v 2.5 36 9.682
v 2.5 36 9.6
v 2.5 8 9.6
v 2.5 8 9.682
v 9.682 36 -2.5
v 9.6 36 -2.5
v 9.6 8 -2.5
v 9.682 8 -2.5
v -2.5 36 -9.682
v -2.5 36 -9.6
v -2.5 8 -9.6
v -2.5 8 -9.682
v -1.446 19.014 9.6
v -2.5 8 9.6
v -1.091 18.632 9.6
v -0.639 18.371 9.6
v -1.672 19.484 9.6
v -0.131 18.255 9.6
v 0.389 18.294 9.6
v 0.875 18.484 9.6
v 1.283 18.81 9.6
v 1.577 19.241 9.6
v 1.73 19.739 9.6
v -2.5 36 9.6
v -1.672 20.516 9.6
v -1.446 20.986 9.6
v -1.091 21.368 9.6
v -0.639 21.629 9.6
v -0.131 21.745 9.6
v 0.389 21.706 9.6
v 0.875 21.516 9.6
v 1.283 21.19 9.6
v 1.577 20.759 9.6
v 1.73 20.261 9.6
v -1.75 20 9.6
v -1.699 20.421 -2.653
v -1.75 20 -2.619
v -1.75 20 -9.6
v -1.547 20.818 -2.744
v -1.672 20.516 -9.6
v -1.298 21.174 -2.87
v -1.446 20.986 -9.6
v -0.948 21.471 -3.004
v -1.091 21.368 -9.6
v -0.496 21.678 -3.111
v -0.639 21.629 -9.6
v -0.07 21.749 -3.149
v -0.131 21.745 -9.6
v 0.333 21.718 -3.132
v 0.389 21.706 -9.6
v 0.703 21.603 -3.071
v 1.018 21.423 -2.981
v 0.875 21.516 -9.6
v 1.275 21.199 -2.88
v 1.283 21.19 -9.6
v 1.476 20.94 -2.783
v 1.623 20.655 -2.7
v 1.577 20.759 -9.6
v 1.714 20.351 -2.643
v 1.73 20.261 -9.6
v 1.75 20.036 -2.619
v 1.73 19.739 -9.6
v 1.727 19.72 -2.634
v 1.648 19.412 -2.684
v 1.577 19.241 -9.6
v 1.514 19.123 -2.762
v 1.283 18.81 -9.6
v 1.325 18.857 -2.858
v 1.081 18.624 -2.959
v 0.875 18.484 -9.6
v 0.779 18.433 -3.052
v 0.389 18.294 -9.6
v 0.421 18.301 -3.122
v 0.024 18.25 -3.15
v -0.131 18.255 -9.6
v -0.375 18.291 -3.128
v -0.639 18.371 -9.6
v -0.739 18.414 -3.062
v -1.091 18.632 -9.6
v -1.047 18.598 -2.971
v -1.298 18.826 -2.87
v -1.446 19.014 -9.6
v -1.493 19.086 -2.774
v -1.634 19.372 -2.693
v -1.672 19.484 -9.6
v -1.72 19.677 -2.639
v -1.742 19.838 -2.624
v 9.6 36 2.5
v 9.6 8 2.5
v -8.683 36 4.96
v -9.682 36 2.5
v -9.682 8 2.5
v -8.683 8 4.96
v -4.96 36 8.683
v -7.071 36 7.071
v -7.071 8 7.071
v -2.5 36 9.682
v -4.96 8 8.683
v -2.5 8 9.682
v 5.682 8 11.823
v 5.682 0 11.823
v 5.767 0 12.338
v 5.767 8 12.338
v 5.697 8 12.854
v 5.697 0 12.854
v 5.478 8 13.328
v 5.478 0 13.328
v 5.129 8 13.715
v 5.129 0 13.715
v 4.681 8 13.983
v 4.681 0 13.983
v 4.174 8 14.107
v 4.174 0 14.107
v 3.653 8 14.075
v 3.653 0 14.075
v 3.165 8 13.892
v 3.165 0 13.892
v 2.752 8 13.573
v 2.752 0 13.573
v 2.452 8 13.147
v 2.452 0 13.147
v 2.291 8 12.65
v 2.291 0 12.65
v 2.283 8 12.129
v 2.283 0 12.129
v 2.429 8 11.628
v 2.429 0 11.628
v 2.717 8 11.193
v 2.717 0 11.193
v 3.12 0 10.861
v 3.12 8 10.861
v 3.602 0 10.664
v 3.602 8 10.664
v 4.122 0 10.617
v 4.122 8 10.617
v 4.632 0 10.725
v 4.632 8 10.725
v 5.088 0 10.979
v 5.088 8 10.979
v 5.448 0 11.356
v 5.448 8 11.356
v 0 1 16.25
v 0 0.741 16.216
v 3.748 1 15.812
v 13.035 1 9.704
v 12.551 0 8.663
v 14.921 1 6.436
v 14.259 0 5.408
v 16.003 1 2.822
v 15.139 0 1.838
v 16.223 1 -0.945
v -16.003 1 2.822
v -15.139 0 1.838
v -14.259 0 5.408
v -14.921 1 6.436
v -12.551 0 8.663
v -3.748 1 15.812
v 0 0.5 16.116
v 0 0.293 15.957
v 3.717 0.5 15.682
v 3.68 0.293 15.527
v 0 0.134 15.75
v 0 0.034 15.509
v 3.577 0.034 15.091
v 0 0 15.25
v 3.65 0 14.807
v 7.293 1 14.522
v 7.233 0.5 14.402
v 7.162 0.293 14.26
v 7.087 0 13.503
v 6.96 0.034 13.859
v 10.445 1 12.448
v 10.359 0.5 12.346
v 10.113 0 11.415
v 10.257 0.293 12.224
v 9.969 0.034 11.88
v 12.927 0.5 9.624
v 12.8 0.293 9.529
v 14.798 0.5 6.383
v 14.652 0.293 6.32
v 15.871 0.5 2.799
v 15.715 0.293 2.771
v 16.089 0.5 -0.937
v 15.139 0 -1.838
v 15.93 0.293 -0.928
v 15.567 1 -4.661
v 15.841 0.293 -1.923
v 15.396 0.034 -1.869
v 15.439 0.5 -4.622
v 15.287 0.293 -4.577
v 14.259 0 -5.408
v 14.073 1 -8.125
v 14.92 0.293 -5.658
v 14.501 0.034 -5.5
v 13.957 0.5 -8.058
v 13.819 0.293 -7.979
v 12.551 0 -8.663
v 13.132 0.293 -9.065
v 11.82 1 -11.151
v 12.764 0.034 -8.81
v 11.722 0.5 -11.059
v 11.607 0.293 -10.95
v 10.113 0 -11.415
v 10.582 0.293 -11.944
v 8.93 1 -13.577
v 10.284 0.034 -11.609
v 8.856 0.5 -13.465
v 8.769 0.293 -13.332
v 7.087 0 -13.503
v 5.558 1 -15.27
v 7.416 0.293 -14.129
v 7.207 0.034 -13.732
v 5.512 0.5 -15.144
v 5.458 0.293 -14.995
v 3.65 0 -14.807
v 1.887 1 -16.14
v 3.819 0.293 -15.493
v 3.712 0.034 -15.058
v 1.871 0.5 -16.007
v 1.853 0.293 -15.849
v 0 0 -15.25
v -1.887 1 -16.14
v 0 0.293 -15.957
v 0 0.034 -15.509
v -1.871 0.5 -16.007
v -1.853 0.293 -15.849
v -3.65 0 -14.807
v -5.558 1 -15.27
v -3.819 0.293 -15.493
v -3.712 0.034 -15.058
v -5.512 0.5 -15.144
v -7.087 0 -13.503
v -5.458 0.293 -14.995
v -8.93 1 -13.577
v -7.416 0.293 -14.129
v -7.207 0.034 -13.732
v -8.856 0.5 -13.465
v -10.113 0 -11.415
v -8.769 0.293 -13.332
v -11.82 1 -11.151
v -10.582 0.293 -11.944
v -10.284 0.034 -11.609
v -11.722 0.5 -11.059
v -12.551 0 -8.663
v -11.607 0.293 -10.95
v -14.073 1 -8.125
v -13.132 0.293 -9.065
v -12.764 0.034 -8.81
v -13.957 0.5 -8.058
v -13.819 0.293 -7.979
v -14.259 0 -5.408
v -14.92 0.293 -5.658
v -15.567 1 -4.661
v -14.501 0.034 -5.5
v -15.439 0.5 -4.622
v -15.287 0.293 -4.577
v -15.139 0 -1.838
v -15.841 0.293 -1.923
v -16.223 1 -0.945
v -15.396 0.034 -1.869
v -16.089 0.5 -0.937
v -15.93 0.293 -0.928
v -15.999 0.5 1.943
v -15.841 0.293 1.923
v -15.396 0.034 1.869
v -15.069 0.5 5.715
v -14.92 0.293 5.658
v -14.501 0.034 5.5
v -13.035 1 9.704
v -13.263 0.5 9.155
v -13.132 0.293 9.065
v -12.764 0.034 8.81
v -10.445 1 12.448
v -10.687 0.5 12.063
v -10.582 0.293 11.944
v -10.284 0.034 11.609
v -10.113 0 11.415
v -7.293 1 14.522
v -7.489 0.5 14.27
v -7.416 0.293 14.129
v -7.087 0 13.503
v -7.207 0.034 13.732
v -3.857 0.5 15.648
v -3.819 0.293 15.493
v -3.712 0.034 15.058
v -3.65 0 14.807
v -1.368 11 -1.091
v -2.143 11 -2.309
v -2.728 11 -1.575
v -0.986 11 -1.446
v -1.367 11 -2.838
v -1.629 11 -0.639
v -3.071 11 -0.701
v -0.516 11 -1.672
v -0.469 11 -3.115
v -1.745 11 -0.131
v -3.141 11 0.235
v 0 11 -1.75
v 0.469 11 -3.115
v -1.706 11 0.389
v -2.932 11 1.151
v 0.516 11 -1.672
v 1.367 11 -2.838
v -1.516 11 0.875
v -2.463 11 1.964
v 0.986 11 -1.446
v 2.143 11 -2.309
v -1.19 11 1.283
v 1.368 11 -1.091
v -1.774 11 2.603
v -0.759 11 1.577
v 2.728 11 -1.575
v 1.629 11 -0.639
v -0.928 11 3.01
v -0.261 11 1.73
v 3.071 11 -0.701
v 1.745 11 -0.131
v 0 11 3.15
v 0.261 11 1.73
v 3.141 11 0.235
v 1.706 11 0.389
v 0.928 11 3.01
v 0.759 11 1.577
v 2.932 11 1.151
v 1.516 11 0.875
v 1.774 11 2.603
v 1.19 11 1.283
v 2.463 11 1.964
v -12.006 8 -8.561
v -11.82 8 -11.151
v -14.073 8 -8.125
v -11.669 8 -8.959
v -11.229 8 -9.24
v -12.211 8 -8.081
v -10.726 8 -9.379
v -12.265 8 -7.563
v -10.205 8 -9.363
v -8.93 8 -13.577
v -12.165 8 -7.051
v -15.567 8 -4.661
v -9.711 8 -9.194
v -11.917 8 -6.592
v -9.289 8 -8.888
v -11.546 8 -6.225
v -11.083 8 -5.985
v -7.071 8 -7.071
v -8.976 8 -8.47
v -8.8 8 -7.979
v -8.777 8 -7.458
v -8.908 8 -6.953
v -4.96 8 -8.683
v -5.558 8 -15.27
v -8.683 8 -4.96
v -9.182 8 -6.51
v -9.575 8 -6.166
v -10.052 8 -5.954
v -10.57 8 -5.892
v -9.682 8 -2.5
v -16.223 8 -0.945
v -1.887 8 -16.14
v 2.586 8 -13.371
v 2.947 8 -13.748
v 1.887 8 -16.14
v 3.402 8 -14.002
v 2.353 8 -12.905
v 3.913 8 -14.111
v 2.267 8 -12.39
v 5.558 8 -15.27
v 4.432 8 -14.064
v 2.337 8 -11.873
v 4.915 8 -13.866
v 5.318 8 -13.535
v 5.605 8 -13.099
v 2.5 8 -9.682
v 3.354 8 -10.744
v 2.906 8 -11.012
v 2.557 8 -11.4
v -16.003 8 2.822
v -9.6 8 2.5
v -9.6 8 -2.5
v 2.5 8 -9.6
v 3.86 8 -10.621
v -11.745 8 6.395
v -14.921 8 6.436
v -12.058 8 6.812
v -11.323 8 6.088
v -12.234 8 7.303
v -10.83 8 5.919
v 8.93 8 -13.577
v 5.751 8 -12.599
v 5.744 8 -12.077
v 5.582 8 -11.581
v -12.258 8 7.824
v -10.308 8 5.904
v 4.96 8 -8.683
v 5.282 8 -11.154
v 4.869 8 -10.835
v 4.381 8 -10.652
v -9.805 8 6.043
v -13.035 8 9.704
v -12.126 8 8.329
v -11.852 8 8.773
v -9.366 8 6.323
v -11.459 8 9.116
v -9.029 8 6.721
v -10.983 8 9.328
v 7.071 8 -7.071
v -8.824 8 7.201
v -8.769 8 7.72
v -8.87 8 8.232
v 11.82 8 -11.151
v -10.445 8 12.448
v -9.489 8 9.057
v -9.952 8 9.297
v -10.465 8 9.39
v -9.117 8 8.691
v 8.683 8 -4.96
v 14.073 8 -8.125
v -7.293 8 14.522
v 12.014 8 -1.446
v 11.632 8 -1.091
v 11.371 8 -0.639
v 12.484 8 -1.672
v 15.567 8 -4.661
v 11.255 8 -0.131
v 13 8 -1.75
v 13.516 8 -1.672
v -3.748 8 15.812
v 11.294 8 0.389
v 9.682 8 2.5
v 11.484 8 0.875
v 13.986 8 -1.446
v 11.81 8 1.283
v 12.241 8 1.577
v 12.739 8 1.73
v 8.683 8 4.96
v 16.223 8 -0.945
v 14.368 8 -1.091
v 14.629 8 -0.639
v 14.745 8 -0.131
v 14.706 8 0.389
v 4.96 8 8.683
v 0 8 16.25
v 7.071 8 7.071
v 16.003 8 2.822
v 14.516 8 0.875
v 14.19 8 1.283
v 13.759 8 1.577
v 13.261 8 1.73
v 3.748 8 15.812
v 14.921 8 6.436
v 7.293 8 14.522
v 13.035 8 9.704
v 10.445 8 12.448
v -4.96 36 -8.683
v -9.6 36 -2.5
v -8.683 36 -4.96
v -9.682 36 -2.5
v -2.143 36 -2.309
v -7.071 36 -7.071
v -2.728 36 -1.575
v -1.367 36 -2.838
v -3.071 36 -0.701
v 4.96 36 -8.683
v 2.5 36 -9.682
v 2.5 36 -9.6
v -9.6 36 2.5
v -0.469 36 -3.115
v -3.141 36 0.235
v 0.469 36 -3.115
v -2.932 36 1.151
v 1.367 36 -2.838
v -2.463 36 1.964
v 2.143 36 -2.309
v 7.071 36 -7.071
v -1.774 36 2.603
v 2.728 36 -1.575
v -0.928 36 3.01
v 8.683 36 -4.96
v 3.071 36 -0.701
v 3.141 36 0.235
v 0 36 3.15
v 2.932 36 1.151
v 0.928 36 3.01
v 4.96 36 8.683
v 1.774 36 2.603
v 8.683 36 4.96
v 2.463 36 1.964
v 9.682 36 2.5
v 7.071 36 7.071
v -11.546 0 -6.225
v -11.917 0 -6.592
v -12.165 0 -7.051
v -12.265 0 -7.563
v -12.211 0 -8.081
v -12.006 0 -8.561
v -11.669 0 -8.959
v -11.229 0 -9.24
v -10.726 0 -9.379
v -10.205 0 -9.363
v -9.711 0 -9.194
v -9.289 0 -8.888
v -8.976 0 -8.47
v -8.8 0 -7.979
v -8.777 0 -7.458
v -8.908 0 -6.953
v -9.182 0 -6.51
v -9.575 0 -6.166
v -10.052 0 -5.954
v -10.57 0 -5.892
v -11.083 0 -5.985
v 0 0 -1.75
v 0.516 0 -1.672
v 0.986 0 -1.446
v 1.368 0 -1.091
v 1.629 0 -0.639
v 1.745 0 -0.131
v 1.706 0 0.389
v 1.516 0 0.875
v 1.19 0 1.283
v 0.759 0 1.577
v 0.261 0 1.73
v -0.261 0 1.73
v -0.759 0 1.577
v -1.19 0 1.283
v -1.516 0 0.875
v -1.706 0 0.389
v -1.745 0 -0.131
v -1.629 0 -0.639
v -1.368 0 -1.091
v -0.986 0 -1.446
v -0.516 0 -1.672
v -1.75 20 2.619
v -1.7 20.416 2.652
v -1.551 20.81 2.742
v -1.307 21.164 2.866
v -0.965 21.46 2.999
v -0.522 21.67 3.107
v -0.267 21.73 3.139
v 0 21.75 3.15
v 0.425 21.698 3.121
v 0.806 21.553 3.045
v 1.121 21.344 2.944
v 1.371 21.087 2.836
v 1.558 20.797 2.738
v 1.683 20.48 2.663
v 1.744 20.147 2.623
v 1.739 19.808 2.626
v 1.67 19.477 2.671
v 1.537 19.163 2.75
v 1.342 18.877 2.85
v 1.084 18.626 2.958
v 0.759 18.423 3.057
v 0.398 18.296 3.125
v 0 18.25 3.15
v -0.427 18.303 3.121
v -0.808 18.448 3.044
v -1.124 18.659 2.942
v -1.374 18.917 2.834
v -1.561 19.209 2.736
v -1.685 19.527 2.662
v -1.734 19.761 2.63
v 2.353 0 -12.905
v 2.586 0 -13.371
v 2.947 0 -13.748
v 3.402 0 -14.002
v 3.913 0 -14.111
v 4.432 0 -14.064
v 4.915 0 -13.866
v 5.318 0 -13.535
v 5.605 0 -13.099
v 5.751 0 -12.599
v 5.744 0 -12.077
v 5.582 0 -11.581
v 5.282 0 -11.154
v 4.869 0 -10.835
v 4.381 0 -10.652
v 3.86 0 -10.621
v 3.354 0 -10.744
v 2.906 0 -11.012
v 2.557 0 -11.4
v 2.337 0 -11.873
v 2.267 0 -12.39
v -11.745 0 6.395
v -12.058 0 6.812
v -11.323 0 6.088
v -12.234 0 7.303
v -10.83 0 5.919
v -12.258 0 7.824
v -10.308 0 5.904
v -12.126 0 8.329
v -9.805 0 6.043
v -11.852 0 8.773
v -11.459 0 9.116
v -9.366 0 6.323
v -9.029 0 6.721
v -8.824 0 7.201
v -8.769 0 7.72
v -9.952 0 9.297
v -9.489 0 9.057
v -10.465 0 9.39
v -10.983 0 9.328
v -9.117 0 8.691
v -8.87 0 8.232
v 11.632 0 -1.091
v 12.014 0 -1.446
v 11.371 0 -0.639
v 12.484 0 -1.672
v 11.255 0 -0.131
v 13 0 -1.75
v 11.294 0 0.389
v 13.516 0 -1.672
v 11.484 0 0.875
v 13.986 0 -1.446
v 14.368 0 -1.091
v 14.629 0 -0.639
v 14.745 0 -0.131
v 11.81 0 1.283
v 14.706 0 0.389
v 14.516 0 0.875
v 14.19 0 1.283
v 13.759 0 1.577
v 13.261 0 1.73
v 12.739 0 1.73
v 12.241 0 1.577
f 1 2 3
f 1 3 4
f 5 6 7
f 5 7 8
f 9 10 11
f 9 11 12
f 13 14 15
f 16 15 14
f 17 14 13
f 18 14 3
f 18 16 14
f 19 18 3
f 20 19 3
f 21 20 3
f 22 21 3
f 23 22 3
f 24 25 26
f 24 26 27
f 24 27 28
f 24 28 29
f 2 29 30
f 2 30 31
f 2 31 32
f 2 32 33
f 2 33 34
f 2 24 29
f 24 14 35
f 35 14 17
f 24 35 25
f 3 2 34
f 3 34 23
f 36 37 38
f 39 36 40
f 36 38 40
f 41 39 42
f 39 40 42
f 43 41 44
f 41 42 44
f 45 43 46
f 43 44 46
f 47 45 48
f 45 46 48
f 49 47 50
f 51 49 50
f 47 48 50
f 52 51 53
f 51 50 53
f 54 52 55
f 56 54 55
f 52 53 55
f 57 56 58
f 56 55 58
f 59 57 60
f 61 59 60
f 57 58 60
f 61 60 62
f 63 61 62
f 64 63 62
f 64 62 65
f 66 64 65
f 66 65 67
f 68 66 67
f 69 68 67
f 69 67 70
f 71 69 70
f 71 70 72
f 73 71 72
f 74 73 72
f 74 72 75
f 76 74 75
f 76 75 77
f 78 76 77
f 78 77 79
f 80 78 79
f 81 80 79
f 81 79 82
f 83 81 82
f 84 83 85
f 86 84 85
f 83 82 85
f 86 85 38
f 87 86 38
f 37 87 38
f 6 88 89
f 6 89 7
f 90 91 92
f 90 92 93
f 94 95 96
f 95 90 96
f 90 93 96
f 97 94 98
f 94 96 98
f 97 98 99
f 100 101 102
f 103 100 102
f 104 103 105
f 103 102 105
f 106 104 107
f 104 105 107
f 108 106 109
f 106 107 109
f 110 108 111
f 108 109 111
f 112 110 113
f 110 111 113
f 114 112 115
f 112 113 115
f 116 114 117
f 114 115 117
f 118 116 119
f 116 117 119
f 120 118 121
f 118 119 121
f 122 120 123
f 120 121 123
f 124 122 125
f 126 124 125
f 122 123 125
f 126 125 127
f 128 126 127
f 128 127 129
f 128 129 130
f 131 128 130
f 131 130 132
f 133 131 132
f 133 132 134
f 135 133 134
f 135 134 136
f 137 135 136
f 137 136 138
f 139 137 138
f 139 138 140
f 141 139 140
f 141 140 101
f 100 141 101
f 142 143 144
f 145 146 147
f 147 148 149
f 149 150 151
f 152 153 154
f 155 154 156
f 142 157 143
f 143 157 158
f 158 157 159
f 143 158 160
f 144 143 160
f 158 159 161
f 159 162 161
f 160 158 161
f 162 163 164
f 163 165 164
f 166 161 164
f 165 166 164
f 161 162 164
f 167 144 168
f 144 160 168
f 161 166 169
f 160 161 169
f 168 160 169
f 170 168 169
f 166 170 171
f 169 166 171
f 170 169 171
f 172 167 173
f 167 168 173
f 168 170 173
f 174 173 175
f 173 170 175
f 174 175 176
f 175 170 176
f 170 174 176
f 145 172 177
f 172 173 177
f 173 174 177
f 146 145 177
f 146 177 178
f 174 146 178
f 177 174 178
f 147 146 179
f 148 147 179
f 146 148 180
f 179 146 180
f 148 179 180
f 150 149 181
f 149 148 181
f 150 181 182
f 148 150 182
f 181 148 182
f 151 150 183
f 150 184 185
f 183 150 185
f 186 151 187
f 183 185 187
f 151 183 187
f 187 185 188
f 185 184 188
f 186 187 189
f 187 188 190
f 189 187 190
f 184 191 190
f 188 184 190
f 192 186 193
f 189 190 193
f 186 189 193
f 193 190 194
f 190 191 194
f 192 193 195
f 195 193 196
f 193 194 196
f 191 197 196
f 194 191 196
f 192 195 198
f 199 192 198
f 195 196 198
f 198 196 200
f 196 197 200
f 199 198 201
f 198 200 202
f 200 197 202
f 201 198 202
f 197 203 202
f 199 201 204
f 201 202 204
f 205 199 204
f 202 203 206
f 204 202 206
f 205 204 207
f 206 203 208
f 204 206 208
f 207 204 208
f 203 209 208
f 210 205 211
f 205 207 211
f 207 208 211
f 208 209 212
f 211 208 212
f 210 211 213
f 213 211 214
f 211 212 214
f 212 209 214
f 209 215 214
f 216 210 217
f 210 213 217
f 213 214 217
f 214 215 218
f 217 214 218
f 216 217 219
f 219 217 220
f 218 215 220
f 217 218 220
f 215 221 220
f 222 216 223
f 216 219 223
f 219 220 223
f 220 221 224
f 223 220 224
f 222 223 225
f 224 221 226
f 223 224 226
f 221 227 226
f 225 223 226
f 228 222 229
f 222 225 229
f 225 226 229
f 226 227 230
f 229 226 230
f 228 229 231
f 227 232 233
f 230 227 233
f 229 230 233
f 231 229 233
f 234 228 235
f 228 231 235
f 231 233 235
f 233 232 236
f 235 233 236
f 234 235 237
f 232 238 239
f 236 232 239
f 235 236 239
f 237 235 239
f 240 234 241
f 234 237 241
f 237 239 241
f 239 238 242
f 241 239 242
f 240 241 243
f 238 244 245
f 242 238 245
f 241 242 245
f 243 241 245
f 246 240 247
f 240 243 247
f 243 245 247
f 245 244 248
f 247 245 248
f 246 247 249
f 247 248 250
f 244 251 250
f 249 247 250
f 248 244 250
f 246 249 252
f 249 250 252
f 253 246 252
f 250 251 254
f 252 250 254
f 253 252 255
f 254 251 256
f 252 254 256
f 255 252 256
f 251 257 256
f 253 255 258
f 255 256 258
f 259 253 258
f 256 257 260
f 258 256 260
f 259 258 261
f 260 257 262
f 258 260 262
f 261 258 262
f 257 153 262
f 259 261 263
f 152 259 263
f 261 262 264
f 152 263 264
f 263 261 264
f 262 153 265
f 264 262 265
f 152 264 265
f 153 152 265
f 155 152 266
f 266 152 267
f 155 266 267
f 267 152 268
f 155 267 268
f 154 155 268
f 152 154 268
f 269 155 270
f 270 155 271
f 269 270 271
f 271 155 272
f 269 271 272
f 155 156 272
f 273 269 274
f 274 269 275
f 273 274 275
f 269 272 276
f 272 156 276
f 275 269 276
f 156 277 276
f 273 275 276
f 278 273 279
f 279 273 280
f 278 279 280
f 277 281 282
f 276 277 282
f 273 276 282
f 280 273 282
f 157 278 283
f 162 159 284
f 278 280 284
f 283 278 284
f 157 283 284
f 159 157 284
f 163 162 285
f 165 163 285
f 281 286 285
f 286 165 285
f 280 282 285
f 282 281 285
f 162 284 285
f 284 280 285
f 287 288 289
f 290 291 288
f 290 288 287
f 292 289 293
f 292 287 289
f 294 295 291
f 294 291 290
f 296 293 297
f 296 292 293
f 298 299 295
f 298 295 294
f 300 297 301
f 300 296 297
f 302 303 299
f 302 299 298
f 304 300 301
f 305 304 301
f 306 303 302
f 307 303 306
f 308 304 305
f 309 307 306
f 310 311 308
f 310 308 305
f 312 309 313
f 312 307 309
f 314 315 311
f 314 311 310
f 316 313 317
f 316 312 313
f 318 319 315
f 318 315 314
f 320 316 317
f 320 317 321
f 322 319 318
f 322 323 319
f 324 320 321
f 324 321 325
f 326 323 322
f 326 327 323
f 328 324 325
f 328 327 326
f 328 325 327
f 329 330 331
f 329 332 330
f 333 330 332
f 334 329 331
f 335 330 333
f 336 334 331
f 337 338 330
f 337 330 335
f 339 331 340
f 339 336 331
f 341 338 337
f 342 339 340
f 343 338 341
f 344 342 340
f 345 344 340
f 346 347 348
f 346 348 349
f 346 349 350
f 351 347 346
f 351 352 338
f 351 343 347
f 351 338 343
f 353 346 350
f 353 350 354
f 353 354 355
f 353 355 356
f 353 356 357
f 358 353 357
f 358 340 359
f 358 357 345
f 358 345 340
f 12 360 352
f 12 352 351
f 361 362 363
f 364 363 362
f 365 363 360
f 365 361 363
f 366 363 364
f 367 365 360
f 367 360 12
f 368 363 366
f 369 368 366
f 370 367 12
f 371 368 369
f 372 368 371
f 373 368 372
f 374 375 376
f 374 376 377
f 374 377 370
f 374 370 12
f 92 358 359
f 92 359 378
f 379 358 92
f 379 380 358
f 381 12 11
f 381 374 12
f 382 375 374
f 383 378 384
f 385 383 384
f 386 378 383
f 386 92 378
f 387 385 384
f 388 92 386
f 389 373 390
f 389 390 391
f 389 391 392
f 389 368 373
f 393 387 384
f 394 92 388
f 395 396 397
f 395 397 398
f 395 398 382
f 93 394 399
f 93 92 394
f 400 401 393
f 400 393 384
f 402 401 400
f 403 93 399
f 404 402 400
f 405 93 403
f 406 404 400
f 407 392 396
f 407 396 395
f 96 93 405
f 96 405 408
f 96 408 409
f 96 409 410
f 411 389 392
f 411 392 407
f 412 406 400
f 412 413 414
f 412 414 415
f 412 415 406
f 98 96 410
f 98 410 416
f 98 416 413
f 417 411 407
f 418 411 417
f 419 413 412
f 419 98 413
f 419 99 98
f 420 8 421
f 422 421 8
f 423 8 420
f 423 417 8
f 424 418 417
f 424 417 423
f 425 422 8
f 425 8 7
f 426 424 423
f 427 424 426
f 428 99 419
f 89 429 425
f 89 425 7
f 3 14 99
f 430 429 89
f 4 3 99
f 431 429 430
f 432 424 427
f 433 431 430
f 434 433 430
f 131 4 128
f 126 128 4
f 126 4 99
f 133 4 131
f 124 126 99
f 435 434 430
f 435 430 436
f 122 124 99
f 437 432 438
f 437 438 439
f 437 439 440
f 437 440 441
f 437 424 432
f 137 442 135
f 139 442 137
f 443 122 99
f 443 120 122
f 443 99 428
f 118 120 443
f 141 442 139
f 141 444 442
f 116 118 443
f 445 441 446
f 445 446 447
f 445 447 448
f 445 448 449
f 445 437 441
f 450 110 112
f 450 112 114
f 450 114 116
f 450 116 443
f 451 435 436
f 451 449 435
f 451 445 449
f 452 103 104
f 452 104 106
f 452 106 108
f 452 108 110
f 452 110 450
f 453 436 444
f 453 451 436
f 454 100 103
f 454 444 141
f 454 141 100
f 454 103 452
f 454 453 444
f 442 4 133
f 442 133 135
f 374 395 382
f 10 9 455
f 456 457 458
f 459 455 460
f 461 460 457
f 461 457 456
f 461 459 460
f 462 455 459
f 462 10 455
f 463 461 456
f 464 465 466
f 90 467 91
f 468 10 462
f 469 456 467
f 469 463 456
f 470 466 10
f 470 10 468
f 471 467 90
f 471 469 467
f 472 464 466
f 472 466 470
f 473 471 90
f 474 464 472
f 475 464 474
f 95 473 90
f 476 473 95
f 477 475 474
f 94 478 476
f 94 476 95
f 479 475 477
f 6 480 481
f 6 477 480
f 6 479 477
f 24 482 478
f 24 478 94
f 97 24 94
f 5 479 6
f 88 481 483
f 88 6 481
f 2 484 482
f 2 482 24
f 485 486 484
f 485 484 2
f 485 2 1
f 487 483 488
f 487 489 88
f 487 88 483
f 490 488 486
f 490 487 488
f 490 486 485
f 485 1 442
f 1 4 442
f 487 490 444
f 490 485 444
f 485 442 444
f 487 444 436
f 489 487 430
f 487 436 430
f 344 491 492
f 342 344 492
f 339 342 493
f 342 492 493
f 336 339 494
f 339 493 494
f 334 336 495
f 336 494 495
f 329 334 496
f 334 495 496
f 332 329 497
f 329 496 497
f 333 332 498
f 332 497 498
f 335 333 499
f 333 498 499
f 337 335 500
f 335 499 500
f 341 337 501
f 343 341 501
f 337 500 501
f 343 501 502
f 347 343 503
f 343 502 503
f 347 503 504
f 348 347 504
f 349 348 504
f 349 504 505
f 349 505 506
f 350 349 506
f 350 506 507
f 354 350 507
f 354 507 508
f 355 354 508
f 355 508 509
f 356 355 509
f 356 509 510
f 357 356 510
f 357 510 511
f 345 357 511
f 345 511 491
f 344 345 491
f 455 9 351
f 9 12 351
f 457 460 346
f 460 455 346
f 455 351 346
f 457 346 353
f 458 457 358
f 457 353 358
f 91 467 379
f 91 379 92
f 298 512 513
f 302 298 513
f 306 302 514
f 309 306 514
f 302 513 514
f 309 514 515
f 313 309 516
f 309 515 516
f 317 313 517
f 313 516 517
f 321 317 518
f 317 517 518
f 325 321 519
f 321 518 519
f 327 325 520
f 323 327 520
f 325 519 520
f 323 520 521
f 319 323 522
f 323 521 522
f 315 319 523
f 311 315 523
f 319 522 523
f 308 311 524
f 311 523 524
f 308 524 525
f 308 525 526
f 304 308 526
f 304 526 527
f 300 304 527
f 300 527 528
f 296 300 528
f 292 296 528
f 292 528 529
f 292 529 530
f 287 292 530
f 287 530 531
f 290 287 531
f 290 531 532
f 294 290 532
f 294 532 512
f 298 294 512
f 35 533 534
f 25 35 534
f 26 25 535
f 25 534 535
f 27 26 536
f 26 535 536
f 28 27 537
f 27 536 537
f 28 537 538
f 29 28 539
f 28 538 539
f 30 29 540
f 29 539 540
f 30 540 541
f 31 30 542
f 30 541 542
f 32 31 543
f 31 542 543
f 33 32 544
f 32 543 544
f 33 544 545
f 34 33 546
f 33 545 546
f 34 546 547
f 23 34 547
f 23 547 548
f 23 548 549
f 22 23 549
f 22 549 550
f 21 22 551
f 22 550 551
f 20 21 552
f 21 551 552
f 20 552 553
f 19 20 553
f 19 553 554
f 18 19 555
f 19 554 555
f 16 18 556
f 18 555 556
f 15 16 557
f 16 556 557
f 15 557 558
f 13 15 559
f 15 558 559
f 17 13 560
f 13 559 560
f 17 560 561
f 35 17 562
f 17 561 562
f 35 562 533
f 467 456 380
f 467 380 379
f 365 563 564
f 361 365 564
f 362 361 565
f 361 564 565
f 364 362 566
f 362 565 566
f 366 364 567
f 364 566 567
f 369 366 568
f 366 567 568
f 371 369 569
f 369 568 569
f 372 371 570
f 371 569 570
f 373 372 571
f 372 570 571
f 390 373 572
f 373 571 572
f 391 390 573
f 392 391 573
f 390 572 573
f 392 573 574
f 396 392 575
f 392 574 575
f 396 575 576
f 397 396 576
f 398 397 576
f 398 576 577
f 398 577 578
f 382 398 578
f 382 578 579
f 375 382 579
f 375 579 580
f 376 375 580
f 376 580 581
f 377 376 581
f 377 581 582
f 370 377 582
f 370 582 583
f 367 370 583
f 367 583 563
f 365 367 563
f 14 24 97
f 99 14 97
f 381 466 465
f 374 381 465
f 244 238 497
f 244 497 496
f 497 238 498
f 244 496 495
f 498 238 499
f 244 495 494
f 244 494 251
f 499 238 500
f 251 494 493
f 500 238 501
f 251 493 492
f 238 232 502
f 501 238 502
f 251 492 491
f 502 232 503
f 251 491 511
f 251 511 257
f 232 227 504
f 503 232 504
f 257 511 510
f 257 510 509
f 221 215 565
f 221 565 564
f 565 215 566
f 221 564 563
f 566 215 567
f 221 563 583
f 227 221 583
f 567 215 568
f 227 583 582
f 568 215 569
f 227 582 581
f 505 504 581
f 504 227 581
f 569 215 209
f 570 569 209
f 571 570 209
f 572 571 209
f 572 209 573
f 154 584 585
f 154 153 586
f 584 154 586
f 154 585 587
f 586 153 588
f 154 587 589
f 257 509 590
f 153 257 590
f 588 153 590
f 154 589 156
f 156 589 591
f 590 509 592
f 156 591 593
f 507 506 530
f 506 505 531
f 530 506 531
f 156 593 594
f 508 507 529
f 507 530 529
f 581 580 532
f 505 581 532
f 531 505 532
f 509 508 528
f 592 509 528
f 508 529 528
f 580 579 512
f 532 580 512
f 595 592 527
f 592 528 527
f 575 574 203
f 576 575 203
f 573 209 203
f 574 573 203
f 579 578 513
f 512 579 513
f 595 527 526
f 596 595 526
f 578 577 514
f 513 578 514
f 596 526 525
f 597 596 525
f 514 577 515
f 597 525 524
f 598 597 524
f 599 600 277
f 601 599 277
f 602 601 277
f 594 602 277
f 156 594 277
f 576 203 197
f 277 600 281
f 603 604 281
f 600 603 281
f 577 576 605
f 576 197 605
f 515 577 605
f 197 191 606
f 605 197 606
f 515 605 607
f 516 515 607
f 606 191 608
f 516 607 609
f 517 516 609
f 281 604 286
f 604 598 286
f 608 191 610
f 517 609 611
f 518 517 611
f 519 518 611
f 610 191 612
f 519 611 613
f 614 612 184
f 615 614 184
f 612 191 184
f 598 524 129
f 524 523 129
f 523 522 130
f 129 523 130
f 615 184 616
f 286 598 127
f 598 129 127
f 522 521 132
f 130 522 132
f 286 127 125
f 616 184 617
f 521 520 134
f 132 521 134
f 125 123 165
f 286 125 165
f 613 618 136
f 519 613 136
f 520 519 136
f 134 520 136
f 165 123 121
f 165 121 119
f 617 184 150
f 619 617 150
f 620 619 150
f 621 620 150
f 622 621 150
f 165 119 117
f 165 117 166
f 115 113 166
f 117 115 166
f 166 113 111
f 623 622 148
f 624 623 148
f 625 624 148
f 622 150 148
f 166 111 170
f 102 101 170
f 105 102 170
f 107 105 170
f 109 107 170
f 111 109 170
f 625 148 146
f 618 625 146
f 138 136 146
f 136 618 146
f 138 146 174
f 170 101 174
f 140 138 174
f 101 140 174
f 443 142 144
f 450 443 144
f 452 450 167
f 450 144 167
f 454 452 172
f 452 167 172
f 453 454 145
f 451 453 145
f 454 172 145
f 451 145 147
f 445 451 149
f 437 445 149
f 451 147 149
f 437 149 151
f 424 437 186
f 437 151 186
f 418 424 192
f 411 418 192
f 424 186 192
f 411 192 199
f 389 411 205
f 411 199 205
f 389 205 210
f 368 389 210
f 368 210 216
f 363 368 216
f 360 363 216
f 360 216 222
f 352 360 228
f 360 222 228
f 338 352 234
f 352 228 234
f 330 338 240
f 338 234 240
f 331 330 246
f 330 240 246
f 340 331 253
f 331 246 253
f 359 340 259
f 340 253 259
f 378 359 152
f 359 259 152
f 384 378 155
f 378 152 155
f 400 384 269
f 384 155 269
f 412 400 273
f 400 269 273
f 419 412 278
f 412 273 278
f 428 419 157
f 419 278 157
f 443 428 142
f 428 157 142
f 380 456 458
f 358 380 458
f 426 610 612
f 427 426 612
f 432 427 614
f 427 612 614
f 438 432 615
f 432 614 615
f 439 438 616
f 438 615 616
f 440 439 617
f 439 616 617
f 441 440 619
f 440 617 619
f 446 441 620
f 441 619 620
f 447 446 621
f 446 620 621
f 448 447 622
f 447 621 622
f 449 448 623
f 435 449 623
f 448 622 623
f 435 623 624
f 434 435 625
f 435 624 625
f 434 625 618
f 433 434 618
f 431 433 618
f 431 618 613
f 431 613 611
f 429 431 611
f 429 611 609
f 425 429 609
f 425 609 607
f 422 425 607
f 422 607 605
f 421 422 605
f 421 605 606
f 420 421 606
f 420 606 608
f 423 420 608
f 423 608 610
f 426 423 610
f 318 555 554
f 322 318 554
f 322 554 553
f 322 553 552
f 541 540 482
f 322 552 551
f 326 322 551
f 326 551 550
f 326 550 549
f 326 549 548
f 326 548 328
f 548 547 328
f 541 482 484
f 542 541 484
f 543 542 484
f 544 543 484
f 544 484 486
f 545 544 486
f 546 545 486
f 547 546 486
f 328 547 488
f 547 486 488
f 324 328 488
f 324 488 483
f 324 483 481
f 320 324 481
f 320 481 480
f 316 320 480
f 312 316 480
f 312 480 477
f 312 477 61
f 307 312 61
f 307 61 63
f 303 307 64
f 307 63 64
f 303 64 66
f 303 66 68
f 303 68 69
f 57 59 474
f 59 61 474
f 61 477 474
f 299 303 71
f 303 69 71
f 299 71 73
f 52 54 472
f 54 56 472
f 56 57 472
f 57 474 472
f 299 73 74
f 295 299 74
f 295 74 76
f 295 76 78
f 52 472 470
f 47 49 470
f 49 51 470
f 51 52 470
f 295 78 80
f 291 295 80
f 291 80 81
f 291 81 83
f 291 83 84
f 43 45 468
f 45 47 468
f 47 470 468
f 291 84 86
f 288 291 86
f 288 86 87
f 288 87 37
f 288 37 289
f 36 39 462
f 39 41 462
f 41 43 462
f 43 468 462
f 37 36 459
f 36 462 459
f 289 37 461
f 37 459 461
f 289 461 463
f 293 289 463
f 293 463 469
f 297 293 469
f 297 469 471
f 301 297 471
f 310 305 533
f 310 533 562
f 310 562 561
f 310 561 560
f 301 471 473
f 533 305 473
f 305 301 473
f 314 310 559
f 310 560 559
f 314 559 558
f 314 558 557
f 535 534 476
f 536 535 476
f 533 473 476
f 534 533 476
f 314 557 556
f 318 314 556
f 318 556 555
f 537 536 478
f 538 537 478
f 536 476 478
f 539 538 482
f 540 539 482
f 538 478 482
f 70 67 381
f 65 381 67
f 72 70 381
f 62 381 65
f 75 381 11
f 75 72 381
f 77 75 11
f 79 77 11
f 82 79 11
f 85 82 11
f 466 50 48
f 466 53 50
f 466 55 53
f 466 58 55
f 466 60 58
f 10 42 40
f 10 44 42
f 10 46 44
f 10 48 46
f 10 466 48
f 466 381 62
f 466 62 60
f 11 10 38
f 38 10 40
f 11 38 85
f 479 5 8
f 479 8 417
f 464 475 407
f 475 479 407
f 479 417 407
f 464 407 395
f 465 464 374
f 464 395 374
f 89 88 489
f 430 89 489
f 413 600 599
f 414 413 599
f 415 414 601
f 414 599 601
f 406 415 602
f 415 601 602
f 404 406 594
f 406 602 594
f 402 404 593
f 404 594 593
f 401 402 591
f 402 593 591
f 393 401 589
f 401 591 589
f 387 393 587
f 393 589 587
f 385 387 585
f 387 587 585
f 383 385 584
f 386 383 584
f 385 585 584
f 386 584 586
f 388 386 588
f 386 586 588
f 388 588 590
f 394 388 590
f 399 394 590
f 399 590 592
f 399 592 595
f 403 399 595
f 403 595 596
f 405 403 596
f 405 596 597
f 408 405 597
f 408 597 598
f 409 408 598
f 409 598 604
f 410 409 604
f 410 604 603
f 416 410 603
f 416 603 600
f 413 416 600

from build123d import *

# Parameters (mm, degrees)
SKETCH1_R           = 16.25
BOSS_EXTRUDE1_DEPTH = 8
SKETCH2_R           = 10
BOSS_EXTRUDE2_DEPTH = 28
SKETCH3_R           = 3.15
CUT_EXTRUDE1_DEPTH  = 25
SKETCH4_W           = 1.193492023
SKETCH4_H           = 5
CUT_EXTRUDE2_DEPTH  = 28
CIRPATTERN1_COUNT   = 4
SKETCH5_R           = 1.75
CUT_EXTRUDE3_DEPTH  = 25
FILLET1_R           = 1
SKETCH6_R           = 1.75
CUT_EXTRUDE4_DEPTH  = 25
SKETCH7_R           = 1.75
CUT_EXTRUDE5_DEPTH  = 10
CIRPATTERN2_COUNT   = 5


with BuildPart() as part:
    # Sketch1 → Boss-Extrude1 (new body)
    with BuildSketch(Plane(origin=(0, 0, 0), x_dir=(1, 0, 0), z_dir=(0, 1, 0))):
        with Locations(Location((0, 0, 0), (0, 0, 270))):
            Circle(SKETCH1_R)
    extrude(amount=BOSS_EXTRUDE1_DEPTH)

    # Sketch2 → Boss-Extrude2 (add)
    with BuildSketch(Plane(origin=(0, 8, 0), x_dir=(1, 0, 0), z_dir=(0, 1, 0))):
        with Locations(Location((0, 0, 0), (0, 0, 270))):
            Circle(SKETCH2_R)
    extrude(amount=BOSS_EXTRUDE2_DEPTH)

    # Sketch3 → Cut-Extrude1 (cut)
    with BuildSketch(Plane(origin=(0, 36, 0), x_dir=(1, 0, 0), z_dir=(0, 1, 0))):
        with Locations(Location((0, 0, 0), (0, 0, 270))):
            Circle(SKETCH3_R)
    extrude(amount=-CUT_EXTRUDE1_DEPTH, mode=Mode.SUBTRACT)

    # Sketch4 → Cut-Extrude2 (cut)
    with BuildSketch(Plane(origin=(0, 36, 0), x_dir=(1, 0, 0), z_dir=(0, 1, 0))):
        with Locations((10.196746012, 0)):
            Rectangle(SKETCH4_W, SKETCH4_H)
    cut_extrude2 = extrude(amount=-CUT_EXTRUDE2_DEPTH, mode=Mode.SUBTRACT)

    # CirPattern1: Cut-Extrude2 ×4 about axis
    cirpattern1_axis = Axis((0, 0, 0), (0, 1, 0))
    for i in range(1, CIRPATTERN1_COUNT):
        add(cut_extrude2.rotate(cirpattern1_axis, i * 360 / CIRPATTERN1_COUNT), mode=Mode.SUBTRACT)

    # Sketch5 → Cut-Extrude3 (cut)
    with BuildSketch(Plane(origin=(0, 0, -9.6), x_dir=(-1, 0, 0), z_dir=(0, 0, -1))):
        with Locations((0, 20)):
            Circle(SKETCH5_R)
    extrude(amount=-CUT_EXTRUDE3_DEPTH, mode=Mode.SUBTRACT)

    # Fillet1
    fillet1_edges = [part.edges().sort_by_distance(p)[0] for p in [
        (0, 0, -16.25),
    ]]
    fillet(fillet1_edges, radius=FILLET1_R)

    # Sketch6 → Cut-Extrude4 (cut)
    with BuildSketch(Plane(origin=(0, 0, 0), x_dir=(-1, 0, 0), z_dir=(0, -1, 0))):
        with Locations(Location((0, 0, 0), (0, 0, 90))):
            Circle(SKETCH6_R)
    extrude(amount=-CUT_EXTRUDE4_DEPTH, mode=Mode.SUBTRACT)

    # Sketch7 → Cut-Extrude5 (cut)
    with BuildSketch(Plane(origin=(0, 0, 0), x_dir=(-1, 0, 0), z_dir=(0, -1, 0))):
        with Locations(Location((-13, 0, 0), (0, 0, 90))):
            Circle(SKETCH7_R)
    cut_extrude5 = extrude(amount=-CUT_EXTRUDE5_DEPTH, mode=Mode.SUBTRACT)

    # CirPattern2: Cut-Extrude5 ×5 about axis
    cirpattern2_axis = Axis((0, 0, 0), (0, 1, 0))
    for i in range(1, CIRPATTERN2_COUNT):
        add(cut_extrude5.rotate(cirpattern2_axis, i * 360 / CIRPATTERN2_COUNT), mode=Mode.SUBTRACT)


solid = part.part
